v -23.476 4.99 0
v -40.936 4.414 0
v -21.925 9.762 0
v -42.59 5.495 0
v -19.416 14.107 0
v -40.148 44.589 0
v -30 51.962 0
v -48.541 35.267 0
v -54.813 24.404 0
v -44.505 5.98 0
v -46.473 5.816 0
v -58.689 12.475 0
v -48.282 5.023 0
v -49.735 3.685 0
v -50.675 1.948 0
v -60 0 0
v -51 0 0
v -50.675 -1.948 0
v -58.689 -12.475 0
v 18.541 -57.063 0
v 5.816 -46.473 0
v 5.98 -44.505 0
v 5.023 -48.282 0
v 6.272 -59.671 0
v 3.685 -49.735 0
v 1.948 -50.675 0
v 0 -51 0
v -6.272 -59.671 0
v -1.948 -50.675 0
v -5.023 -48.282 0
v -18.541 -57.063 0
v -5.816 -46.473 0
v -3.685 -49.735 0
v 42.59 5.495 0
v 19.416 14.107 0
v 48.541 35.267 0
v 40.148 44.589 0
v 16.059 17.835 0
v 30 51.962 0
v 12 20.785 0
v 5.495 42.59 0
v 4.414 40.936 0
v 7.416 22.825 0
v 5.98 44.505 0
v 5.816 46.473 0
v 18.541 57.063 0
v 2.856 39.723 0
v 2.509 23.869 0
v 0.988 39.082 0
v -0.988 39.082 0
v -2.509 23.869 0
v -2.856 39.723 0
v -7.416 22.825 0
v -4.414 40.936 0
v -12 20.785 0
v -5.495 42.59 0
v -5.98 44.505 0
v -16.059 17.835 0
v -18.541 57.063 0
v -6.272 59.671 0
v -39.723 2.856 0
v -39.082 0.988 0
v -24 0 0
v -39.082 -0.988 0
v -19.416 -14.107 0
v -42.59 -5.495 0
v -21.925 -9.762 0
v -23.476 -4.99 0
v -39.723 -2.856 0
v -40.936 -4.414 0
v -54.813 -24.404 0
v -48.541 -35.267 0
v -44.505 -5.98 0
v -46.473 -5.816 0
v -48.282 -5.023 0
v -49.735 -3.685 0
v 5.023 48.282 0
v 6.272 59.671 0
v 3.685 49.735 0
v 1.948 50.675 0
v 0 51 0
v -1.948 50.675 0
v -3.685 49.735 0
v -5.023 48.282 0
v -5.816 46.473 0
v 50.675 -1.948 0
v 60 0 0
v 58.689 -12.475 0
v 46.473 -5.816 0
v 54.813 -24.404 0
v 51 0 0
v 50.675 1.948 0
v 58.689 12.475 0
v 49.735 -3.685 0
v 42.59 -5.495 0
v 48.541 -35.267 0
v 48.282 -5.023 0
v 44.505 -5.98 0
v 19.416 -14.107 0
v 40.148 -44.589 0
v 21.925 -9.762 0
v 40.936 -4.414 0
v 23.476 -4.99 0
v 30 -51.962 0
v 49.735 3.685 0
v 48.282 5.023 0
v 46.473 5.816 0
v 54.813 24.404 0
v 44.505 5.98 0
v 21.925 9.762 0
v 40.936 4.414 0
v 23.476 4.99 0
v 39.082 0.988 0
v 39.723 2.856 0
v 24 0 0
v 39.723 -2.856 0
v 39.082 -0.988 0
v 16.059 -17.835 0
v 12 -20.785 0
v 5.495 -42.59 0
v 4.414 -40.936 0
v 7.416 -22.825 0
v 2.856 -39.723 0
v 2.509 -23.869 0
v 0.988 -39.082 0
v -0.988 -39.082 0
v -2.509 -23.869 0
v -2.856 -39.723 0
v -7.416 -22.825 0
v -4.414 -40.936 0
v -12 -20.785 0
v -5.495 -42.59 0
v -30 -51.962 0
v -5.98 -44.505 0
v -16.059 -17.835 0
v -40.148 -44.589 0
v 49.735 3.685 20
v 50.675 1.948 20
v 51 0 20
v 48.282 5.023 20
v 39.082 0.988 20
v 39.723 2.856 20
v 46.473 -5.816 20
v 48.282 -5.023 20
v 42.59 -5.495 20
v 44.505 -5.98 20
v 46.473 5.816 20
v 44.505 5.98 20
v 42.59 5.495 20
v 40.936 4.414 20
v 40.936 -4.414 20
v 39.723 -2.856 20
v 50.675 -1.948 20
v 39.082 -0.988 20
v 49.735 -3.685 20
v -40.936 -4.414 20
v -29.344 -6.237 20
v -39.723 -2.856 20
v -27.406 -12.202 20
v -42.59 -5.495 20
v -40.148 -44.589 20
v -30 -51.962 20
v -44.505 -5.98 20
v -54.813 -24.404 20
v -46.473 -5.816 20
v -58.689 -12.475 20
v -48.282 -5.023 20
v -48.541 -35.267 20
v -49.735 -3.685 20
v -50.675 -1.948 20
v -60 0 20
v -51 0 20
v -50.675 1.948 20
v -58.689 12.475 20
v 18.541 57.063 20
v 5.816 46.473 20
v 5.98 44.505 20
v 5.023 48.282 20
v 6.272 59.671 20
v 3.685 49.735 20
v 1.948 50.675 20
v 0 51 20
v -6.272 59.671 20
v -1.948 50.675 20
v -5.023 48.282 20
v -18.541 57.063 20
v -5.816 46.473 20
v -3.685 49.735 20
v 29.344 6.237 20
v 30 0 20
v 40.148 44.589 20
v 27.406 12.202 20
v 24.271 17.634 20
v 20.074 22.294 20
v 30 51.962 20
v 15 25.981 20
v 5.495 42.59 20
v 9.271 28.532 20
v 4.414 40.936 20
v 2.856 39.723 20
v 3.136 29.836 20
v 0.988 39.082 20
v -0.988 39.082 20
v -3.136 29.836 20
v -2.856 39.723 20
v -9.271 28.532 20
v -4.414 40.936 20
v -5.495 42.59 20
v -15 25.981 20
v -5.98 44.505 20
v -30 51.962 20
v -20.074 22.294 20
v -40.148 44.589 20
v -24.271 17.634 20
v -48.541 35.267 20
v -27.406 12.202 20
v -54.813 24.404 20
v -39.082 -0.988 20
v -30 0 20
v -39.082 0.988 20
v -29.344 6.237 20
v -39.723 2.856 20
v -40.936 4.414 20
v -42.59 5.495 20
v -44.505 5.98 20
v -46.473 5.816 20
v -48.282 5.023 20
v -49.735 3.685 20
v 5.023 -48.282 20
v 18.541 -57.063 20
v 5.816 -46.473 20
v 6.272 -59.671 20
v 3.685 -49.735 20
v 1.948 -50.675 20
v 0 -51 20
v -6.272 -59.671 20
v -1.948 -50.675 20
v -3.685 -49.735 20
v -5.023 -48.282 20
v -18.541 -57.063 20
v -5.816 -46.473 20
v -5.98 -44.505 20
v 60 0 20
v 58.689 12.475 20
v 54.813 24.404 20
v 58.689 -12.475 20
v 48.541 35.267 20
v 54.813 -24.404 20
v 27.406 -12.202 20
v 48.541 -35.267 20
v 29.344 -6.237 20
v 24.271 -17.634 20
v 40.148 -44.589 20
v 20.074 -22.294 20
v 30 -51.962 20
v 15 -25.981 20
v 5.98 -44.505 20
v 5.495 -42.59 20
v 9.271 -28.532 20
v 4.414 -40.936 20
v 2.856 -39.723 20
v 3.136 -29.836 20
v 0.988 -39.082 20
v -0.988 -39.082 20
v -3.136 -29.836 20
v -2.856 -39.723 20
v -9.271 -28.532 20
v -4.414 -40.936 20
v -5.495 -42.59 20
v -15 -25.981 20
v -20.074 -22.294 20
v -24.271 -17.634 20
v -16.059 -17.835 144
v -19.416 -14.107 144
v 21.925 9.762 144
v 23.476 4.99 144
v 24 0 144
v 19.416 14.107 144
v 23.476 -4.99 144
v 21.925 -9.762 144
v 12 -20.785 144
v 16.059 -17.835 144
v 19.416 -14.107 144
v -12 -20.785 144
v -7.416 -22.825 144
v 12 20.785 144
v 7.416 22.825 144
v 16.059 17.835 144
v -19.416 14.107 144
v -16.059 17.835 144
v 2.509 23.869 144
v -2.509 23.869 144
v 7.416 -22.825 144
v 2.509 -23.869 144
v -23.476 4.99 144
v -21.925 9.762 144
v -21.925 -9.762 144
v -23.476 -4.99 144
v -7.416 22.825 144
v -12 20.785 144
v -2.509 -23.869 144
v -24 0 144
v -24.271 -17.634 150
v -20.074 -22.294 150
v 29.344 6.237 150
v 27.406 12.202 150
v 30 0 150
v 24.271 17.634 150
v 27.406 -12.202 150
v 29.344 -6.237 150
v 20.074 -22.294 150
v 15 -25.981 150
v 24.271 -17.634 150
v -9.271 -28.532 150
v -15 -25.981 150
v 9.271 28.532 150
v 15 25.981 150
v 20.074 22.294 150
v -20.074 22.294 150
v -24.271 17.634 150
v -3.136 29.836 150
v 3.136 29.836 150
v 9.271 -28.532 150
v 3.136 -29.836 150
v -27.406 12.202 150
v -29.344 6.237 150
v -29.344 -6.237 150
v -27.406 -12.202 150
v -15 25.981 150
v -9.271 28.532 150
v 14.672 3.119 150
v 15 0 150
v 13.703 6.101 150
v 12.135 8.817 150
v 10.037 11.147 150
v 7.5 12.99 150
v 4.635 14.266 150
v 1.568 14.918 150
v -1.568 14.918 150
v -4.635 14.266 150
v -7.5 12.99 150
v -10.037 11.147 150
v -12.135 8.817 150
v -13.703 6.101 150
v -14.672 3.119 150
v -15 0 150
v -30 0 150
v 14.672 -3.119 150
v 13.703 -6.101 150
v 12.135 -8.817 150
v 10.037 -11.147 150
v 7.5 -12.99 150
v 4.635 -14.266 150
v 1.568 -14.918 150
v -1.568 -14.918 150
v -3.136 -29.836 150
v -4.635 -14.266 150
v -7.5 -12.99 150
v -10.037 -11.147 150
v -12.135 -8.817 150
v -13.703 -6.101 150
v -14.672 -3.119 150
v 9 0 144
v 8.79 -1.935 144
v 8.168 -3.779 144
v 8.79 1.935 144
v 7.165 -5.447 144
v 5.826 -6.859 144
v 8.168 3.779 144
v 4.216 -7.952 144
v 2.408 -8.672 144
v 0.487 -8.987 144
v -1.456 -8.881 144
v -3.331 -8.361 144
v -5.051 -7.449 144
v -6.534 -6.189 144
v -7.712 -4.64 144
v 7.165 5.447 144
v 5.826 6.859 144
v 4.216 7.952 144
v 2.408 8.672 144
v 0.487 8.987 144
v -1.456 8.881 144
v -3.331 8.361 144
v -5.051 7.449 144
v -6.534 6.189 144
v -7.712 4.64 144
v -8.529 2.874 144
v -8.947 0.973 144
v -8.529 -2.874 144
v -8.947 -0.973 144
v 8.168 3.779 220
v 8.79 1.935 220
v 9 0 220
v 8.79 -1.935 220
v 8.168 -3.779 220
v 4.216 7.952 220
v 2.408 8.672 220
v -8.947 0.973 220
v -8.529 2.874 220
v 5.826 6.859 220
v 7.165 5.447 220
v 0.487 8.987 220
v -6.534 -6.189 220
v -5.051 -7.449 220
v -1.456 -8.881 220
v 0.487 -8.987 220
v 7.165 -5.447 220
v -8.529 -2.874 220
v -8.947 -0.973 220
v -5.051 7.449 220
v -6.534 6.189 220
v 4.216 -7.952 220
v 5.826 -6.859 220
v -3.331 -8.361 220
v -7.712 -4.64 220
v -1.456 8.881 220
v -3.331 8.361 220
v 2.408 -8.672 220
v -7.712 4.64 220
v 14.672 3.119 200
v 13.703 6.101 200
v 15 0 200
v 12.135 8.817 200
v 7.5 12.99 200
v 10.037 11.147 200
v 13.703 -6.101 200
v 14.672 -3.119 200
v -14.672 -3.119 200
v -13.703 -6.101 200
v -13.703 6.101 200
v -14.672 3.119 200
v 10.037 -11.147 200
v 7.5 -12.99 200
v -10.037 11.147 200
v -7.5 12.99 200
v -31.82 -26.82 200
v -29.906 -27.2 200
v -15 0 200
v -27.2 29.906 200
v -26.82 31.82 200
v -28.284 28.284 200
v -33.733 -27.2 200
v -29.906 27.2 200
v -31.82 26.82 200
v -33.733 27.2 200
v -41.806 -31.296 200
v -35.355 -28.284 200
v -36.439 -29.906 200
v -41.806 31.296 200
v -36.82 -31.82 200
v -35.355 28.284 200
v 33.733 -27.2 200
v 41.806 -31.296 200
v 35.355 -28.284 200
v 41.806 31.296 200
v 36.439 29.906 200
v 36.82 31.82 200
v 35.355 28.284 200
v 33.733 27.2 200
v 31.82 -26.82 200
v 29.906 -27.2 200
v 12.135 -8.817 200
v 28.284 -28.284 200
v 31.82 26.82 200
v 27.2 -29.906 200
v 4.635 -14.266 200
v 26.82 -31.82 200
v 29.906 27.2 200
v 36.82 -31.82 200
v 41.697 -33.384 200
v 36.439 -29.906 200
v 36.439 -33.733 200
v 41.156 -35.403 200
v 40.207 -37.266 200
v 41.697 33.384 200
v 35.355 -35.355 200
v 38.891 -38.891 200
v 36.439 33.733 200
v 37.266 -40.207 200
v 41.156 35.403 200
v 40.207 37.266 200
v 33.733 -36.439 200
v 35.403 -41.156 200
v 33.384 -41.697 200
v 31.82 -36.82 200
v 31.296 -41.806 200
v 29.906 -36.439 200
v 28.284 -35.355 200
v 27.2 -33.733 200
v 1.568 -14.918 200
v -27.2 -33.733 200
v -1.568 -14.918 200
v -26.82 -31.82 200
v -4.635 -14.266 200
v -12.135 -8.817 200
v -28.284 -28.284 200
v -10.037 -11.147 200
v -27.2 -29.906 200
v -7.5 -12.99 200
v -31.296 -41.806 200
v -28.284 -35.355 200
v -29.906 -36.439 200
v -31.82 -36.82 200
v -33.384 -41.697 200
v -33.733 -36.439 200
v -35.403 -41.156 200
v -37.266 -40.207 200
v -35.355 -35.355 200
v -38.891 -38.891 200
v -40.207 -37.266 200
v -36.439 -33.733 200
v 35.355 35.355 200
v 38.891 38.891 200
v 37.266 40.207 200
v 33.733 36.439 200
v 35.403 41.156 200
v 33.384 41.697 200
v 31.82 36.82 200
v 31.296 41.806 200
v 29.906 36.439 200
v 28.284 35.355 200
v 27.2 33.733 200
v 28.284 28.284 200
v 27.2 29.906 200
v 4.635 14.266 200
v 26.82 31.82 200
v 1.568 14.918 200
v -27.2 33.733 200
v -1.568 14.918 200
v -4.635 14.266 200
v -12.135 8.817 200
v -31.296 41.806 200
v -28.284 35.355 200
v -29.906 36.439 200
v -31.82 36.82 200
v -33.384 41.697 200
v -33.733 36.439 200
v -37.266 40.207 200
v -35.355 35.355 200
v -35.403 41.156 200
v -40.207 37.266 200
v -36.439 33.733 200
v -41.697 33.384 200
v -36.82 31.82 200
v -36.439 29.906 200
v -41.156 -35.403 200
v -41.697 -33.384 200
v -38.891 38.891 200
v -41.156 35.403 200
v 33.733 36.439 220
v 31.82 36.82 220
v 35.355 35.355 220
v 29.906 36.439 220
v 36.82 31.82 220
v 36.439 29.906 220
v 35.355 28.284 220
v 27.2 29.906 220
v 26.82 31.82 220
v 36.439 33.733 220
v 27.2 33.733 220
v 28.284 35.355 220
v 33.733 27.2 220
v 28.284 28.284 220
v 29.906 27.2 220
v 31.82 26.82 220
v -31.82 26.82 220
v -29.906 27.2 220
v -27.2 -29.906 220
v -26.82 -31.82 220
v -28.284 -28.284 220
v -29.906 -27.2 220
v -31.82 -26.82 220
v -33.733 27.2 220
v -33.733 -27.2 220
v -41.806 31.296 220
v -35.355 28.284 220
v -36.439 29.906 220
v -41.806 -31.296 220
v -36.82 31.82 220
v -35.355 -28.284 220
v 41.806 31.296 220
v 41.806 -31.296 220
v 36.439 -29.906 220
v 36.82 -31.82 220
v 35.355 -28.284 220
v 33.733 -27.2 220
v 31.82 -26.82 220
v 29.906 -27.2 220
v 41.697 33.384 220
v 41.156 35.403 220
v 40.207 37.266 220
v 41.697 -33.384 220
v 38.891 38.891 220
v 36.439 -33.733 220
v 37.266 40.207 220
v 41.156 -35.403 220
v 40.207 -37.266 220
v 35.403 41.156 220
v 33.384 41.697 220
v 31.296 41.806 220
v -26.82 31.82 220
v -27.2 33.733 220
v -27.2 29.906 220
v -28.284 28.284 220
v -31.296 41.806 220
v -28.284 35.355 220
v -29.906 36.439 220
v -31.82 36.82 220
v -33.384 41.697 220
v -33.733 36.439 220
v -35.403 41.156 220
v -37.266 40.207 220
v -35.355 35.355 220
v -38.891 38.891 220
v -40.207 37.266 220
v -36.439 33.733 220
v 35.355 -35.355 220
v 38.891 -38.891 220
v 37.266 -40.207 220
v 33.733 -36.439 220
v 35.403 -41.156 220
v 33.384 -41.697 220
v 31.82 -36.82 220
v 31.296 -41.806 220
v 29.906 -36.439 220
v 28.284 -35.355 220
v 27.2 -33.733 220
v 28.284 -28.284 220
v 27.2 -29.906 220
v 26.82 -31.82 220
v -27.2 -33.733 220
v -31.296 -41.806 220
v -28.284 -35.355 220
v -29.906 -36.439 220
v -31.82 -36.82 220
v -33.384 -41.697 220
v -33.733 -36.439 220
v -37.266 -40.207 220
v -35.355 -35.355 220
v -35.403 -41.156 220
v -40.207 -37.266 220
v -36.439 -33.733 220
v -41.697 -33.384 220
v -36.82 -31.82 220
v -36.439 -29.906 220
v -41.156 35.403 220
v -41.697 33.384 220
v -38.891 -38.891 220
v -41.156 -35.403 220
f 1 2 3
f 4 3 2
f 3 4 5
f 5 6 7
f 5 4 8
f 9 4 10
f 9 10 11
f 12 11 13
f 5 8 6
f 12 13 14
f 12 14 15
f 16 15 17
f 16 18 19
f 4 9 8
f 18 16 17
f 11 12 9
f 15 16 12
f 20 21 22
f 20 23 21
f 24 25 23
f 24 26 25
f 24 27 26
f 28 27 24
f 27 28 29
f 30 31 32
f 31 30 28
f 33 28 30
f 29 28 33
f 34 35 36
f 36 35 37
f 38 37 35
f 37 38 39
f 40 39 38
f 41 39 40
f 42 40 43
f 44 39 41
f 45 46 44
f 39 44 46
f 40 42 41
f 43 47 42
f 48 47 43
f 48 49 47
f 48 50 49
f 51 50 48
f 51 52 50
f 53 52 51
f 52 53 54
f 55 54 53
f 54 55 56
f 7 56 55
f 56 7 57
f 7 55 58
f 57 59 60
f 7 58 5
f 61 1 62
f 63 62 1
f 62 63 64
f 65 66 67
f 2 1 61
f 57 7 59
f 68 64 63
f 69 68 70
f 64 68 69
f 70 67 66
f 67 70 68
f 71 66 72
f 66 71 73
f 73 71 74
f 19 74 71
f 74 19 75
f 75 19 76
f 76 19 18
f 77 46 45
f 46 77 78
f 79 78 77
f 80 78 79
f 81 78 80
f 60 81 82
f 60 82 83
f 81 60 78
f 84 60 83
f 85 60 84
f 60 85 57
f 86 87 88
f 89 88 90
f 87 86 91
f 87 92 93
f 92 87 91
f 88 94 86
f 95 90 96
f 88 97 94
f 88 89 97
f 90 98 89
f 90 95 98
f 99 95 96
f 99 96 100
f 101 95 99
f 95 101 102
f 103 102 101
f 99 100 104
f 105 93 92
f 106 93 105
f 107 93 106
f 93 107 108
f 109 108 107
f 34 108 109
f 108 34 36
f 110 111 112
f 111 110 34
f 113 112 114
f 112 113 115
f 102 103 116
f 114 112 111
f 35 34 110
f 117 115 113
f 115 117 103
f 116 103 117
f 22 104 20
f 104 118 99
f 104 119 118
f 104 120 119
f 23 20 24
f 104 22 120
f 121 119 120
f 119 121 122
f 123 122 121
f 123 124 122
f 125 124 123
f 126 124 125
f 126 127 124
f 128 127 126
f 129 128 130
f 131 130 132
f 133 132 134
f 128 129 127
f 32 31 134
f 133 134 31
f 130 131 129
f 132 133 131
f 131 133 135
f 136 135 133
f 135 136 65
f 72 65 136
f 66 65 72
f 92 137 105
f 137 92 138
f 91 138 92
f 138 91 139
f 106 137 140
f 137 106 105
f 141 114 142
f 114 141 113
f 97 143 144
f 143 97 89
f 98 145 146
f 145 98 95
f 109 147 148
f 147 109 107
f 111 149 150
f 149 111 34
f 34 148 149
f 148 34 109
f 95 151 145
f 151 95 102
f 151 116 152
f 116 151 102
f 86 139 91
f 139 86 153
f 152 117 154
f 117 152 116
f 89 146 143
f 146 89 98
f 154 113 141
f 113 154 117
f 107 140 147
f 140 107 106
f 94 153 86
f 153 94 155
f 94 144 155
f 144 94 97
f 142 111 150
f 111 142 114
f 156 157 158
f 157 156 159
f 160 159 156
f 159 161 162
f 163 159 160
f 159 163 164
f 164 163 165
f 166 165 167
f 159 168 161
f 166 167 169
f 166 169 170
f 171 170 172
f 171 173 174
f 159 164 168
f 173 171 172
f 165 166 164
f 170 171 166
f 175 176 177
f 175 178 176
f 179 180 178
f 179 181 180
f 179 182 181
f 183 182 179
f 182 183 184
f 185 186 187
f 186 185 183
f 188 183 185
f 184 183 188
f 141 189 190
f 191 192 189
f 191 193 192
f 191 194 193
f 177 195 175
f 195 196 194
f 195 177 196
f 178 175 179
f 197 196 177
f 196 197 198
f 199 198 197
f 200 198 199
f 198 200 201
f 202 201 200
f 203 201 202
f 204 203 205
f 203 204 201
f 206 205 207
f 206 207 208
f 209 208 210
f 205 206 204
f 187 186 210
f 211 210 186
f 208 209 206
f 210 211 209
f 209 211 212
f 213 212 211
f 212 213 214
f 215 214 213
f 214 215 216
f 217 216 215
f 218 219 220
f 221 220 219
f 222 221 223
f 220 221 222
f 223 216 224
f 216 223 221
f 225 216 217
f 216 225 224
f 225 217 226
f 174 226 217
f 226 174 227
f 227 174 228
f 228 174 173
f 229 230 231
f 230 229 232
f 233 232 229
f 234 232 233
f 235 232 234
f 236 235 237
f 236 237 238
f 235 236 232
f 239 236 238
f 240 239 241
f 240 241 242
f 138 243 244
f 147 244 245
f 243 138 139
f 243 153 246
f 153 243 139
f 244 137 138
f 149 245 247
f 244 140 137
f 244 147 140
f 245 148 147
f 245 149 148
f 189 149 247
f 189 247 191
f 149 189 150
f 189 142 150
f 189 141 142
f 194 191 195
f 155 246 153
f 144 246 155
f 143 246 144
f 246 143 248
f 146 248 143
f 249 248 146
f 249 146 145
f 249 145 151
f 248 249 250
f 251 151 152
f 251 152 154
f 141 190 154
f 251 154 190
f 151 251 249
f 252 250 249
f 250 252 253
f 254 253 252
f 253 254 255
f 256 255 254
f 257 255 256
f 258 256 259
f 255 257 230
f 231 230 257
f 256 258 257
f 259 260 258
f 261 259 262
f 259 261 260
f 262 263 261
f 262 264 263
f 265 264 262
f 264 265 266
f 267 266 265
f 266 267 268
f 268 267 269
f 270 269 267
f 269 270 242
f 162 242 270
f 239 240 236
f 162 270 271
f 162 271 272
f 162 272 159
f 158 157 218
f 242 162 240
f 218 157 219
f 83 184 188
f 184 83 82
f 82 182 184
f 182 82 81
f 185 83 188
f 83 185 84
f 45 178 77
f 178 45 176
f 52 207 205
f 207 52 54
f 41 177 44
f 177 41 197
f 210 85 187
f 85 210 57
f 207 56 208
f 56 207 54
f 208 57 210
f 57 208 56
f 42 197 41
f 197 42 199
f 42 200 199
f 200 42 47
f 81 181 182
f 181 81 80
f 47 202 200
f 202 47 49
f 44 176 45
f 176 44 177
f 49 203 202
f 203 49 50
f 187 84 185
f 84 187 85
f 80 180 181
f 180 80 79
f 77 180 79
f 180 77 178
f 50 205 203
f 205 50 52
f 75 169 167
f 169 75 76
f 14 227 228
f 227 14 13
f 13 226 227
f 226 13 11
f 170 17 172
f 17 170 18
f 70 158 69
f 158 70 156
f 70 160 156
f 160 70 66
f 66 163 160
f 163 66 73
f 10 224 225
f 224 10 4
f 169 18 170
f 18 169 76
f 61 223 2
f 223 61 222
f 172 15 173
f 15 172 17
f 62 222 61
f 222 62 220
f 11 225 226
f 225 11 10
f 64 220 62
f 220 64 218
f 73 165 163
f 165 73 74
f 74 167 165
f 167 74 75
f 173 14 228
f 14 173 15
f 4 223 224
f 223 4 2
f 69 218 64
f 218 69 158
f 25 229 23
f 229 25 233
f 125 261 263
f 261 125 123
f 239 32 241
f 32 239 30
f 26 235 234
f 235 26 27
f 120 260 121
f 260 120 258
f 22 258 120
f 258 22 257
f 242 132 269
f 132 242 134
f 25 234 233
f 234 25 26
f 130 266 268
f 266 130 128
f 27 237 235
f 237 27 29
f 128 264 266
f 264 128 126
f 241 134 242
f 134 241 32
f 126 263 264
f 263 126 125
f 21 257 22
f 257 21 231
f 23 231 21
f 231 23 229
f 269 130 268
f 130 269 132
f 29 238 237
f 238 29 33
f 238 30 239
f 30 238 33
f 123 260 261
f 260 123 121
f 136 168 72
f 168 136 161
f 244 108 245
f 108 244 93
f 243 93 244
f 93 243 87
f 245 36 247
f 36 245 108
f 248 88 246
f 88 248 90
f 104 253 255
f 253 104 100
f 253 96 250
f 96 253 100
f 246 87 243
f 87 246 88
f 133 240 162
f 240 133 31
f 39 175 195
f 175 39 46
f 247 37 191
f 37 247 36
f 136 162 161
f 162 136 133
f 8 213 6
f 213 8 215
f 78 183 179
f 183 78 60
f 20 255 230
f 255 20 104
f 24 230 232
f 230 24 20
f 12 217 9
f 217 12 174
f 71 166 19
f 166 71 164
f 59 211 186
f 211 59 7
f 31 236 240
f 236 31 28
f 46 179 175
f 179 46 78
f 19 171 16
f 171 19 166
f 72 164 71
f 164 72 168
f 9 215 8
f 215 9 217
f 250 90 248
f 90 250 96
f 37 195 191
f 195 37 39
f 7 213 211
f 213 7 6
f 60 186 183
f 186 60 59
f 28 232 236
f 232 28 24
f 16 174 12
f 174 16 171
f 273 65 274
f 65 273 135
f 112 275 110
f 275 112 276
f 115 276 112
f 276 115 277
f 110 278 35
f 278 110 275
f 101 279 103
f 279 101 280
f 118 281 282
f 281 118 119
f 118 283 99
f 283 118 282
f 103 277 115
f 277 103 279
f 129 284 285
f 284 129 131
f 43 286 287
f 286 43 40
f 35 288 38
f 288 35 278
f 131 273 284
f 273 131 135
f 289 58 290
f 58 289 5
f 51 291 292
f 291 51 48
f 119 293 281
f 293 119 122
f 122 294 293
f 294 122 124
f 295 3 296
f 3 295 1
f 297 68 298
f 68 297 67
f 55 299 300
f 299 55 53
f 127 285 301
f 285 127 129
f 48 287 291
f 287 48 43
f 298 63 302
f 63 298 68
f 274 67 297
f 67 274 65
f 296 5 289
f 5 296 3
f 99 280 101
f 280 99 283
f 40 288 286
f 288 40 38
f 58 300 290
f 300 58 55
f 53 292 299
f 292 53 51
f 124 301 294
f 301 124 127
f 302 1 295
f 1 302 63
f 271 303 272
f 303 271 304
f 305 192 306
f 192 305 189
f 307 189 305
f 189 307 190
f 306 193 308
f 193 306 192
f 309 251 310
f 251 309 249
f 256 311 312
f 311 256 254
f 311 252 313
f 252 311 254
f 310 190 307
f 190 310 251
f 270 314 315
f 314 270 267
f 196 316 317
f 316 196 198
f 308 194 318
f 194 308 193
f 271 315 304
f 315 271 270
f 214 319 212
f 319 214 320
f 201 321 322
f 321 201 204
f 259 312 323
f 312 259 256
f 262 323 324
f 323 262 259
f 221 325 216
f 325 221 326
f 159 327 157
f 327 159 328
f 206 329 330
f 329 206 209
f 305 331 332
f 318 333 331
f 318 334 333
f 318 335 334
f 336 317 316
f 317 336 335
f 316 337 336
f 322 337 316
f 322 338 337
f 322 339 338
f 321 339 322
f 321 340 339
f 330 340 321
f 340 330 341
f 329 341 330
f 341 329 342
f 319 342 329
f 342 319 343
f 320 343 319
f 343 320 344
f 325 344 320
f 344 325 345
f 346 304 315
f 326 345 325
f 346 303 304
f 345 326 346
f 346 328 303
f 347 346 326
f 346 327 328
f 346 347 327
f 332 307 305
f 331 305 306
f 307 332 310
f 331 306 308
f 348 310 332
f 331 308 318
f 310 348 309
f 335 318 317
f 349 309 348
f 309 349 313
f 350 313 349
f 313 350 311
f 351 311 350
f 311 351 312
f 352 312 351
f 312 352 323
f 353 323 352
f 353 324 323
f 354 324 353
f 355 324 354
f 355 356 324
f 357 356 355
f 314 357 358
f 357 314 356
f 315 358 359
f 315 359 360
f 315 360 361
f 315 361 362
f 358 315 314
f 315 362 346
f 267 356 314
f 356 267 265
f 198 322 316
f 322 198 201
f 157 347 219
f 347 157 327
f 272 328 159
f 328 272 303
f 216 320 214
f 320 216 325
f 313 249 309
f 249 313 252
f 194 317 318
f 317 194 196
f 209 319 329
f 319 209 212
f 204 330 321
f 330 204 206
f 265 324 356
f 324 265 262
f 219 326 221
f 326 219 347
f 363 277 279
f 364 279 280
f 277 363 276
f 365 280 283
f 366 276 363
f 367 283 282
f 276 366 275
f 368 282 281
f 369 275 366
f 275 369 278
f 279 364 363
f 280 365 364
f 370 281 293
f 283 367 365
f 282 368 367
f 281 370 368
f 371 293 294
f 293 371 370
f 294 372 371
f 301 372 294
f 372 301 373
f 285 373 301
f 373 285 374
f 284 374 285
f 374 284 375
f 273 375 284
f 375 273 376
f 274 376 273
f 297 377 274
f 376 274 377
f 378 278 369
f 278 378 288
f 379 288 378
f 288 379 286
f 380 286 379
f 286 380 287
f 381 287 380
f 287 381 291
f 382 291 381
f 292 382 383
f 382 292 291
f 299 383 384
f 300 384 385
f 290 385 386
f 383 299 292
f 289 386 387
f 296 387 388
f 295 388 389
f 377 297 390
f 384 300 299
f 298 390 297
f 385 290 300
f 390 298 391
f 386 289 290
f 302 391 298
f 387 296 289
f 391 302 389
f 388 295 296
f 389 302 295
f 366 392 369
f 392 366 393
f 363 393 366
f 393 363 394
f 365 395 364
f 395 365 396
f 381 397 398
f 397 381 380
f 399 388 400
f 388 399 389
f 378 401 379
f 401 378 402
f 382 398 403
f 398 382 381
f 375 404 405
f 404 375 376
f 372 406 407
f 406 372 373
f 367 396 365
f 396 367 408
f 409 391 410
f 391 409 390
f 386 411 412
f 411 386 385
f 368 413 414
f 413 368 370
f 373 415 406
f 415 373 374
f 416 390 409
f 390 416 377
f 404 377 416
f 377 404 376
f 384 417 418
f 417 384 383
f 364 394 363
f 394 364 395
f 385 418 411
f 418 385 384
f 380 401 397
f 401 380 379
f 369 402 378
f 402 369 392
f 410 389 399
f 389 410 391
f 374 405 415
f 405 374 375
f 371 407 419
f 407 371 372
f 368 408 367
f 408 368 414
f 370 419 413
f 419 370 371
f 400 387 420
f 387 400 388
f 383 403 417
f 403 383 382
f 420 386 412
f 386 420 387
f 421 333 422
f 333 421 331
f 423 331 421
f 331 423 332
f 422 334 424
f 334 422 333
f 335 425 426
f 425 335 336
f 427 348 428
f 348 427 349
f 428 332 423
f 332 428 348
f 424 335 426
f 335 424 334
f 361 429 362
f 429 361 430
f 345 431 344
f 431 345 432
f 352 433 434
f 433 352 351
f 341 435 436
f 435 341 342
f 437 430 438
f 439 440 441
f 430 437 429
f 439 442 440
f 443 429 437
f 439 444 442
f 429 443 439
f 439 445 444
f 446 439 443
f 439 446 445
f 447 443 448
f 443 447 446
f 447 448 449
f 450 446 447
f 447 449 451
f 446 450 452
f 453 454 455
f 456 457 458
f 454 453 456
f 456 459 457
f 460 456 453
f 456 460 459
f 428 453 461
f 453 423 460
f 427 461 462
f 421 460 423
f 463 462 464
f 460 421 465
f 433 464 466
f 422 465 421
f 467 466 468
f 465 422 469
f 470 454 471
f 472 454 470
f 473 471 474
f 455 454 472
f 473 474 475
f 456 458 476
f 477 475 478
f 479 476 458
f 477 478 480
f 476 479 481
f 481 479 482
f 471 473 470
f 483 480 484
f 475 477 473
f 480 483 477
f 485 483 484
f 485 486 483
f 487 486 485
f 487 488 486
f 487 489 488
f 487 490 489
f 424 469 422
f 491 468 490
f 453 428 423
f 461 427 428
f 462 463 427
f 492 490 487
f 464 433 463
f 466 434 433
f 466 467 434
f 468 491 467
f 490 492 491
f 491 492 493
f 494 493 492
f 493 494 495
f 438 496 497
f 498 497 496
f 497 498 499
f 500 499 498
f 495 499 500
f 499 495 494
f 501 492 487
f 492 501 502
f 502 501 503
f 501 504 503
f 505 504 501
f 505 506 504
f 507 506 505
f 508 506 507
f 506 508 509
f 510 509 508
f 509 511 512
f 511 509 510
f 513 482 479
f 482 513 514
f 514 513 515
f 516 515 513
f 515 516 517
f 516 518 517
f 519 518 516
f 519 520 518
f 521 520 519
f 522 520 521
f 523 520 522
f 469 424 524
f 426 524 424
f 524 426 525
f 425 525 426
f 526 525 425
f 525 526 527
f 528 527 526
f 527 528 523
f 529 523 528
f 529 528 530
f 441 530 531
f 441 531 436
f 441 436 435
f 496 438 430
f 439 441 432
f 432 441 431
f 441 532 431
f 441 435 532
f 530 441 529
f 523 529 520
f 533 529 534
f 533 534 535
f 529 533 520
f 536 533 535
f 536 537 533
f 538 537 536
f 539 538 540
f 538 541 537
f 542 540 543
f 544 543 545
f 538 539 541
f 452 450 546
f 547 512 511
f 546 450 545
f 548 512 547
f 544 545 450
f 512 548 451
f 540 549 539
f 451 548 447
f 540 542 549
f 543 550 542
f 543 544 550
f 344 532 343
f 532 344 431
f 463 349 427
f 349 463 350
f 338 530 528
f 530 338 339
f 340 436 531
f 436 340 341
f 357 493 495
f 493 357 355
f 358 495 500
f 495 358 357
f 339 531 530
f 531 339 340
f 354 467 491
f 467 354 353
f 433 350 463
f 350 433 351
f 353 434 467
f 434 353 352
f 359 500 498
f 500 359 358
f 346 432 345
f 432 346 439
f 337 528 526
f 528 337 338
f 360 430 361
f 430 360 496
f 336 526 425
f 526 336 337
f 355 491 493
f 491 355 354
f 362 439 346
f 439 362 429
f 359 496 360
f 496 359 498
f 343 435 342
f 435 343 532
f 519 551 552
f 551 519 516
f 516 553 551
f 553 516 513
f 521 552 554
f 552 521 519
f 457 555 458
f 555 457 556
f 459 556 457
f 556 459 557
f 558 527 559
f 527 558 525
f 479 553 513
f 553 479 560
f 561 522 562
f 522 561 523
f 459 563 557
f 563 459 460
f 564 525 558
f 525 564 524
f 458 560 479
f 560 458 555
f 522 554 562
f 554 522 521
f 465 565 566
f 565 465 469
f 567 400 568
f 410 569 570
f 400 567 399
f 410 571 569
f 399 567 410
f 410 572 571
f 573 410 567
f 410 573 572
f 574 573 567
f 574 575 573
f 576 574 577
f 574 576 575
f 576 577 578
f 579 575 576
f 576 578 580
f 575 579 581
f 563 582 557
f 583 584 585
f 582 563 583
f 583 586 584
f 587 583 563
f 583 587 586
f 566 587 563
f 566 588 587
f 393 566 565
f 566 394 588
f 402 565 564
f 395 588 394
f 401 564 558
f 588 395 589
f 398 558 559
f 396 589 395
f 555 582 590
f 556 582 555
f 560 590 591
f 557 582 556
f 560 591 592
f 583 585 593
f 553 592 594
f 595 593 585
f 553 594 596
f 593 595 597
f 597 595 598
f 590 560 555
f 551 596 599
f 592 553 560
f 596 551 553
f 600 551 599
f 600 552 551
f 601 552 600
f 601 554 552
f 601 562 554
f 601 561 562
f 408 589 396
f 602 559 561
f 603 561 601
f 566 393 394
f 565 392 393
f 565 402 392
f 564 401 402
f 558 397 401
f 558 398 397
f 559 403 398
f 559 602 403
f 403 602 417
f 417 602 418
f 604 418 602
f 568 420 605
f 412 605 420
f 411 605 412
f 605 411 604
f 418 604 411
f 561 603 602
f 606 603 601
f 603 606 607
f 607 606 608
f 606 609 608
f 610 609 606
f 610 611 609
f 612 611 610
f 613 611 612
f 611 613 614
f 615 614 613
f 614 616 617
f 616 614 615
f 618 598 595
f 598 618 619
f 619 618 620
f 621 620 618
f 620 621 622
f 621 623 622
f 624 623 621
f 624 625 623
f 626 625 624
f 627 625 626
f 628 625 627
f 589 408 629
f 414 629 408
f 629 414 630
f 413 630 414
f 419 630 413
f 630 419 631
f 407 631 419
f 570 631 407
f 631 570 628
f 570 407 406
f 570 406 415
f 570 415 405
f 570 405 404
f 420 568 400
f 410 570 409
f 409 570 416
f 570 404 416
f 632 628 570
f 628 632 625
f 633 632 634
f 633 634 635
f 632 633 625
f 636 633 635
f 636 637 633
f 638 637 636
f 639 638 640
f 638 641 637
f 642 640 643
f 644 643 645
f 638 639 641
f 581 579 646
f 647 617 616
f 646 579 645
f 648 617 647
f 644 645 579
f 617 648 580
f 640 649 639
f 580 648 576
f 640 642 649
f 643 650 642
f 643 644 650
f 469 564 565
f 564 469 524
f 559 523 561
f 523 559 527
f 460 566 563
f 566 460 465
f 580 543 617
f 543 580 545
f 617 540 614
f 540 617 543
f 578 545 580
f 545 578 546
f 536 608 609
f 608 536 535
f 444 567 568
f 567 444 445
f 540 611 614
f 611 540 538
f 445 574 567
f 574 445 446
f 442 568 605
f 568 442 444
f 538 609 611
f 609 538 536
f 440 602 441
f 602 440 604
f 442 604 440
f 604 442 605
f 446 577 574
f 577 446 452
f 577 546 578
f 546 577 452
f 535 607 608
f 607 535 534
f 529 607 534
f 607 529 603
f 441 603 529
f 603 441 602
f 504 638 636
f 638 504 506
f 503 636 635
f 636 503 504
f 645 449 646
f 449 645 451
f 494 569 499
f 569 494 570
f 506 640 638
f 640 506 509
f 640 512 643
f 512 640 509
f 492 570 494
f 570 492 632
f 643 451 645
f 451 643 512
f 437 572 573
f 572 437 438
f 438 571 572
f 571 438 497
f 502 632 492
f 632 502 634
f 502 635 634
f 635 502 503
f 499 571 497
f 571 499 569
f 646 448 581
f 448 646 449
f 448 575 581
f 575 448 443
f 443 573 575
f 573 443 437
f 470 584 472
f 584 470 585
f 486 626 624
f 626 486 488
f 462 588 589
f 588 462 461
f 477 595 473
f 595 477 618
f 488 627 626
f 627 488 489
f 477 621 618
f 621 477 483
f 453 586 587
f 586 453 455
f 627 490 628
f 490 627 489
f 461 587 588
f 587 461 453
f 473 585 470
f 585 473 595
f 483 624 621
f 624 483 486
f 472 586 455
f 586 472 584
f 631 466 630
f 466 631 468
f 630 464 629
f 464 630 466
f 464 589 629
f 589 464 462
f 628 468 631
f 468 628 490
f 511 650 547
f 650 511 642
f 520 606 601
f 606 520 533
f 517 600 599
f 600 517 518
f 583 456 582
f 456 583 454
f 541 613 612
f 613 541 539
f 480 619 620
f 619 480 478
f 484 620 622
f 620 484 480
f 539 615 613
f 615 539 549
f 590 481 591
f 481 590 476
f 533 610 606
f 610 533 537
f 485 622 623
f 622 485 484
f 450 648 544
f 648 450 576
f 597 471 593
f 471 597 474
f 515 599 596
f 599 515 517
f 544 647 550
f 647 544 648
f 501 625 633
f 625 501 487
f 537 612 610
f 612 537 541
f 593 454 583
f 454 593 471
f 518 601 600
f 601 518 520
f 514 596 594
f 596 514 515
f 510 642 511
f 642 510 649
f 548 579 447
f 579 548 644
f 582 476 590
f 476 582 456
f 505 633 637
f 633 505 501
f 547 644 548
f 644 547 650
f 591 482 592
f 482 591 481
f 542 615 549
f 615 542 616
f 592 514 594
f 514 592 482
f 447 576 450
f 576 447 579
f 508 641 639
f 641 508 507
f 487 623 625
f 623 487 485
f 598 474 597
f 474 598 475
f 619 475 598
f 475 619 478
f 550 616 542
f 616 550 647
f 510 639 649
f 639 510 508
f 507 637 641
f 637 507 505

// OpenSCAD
// Base Cylinder
baseCylinderHeight = 20;
baseCylinderDiameter = 120;
    //translations
        baseCylinderZ = baseCylinderHeight;

//Cylinder Mounting Hole Values
baseCylCutMountHolesDiameter = 12;
baseCylOffsetRadiusX = 45;
baseCylMountCutDepth = baseCylinderHeight;

//Main Shaft        
longCylinderHeight = 130;
longCylinderDiameter = 60;

//Short Shaft
smallerLongCylinderHeight = 50;
smallerLongCylinderDiameter = 30;

//Inside Cylinder Cuts Bigger
biggerInsideCutsHeight = 144;
biggerInsideCutsDiameter = 48;

//Top Cube Block
cubeDepth = 20;
cubeCornercylinderRadiusOutside = 10;
cubeCornercylinderDiameterInside = 10;
    //Translation for the Top Cube Block
    cubeShiftUpZ = baseCylinderHeight + longCylinderHeight;
    outsideYoffsetCylCut = 45;

//Inside Cylinder Cuts Smaller
smallerInsideCutsHeight = (smallerLongCylinderHeight + cubeDepth);
smallerInsideCutsDiameter = 18;


//Code for the Part

difference(){
    cylinder(baseCylinderHeight, d = baseCylinderDiameter);//Base cylinder
    
    cylinder(biggerInsideCutsHeight, d = biggerInsideCutsDiameter); //The Big Cut
    
    for ( hole = [0:360/4:360]){
    rotate([ 0, 0, hole])
    translate([baseCylOffsetRadiusX, 0, 0])
    cylinder(baseCylMountCutDepth, d = baseCylCutMountHolesDiameter);
    }//Mounting Hole Cuts
 }
         
difference(){
    translate([ 0, 0, baseCylinderZ])
    cylinder(longCylinderHeight, d = longCylinderDiameter);//The Main Cylinder 

    cylinder(biggerInsideCutsHeight, d = biggerInsideCutsDiameter); //The Big Cut

    cylinder( longCylinderHeight + baseCylinderHeight + smallerLongCylinderHeight, d = smallerInsideCutsDiameter);//The Little Cut
}

difference(){
    translate([ 0, 0,baseCylinderHeight + longCylinderHeight])
    cylinder(smallerLongCylinderHeight, d = smallerLongCylinderDiameter);//The Little long Cylinder

    cylinder( longCylinderHeight + baseCylinderHeight + smallerLongCylinderHeight, d = smallerInsideCutsDiameter);//The Little Cut

    
}


difference(){
    hull(){
        for ( corner = [0:360/4:360]){
            rotate([ 0, 0, corner + outsideYoffsetCylCut])
            translate([baseCylOffsetRadiusX, 0, baseCylinderHeight + longCylinderHeight + smallerLongCylinderHeight])
            cylinder(baseCylMountCutDepth, r = cubeCornercylinderRadiusOutside);// The Top Cube 
        }
    }
        
    for ( corner = [0:360/4:360]){
            rotate([ 0, 0, corner + outsideYoffsetCylCut])
            translate([baseCylOffsetRadiusX, 0, baseCylinderHeight + longCylinderHeight + smallerLongCylinderHeight])
            cylinder(baseCylMountCutDepth, d = cubeCornercylinderDiameterInside);// The Top Cube Cuts
        
        }
    
    cylinder( longCylinderHeight + baseCylinderHeight + smallerLongCylinderHeight + cubeDepth, d = smallerInsideCutsDiameter);//The Little Cut
    }
